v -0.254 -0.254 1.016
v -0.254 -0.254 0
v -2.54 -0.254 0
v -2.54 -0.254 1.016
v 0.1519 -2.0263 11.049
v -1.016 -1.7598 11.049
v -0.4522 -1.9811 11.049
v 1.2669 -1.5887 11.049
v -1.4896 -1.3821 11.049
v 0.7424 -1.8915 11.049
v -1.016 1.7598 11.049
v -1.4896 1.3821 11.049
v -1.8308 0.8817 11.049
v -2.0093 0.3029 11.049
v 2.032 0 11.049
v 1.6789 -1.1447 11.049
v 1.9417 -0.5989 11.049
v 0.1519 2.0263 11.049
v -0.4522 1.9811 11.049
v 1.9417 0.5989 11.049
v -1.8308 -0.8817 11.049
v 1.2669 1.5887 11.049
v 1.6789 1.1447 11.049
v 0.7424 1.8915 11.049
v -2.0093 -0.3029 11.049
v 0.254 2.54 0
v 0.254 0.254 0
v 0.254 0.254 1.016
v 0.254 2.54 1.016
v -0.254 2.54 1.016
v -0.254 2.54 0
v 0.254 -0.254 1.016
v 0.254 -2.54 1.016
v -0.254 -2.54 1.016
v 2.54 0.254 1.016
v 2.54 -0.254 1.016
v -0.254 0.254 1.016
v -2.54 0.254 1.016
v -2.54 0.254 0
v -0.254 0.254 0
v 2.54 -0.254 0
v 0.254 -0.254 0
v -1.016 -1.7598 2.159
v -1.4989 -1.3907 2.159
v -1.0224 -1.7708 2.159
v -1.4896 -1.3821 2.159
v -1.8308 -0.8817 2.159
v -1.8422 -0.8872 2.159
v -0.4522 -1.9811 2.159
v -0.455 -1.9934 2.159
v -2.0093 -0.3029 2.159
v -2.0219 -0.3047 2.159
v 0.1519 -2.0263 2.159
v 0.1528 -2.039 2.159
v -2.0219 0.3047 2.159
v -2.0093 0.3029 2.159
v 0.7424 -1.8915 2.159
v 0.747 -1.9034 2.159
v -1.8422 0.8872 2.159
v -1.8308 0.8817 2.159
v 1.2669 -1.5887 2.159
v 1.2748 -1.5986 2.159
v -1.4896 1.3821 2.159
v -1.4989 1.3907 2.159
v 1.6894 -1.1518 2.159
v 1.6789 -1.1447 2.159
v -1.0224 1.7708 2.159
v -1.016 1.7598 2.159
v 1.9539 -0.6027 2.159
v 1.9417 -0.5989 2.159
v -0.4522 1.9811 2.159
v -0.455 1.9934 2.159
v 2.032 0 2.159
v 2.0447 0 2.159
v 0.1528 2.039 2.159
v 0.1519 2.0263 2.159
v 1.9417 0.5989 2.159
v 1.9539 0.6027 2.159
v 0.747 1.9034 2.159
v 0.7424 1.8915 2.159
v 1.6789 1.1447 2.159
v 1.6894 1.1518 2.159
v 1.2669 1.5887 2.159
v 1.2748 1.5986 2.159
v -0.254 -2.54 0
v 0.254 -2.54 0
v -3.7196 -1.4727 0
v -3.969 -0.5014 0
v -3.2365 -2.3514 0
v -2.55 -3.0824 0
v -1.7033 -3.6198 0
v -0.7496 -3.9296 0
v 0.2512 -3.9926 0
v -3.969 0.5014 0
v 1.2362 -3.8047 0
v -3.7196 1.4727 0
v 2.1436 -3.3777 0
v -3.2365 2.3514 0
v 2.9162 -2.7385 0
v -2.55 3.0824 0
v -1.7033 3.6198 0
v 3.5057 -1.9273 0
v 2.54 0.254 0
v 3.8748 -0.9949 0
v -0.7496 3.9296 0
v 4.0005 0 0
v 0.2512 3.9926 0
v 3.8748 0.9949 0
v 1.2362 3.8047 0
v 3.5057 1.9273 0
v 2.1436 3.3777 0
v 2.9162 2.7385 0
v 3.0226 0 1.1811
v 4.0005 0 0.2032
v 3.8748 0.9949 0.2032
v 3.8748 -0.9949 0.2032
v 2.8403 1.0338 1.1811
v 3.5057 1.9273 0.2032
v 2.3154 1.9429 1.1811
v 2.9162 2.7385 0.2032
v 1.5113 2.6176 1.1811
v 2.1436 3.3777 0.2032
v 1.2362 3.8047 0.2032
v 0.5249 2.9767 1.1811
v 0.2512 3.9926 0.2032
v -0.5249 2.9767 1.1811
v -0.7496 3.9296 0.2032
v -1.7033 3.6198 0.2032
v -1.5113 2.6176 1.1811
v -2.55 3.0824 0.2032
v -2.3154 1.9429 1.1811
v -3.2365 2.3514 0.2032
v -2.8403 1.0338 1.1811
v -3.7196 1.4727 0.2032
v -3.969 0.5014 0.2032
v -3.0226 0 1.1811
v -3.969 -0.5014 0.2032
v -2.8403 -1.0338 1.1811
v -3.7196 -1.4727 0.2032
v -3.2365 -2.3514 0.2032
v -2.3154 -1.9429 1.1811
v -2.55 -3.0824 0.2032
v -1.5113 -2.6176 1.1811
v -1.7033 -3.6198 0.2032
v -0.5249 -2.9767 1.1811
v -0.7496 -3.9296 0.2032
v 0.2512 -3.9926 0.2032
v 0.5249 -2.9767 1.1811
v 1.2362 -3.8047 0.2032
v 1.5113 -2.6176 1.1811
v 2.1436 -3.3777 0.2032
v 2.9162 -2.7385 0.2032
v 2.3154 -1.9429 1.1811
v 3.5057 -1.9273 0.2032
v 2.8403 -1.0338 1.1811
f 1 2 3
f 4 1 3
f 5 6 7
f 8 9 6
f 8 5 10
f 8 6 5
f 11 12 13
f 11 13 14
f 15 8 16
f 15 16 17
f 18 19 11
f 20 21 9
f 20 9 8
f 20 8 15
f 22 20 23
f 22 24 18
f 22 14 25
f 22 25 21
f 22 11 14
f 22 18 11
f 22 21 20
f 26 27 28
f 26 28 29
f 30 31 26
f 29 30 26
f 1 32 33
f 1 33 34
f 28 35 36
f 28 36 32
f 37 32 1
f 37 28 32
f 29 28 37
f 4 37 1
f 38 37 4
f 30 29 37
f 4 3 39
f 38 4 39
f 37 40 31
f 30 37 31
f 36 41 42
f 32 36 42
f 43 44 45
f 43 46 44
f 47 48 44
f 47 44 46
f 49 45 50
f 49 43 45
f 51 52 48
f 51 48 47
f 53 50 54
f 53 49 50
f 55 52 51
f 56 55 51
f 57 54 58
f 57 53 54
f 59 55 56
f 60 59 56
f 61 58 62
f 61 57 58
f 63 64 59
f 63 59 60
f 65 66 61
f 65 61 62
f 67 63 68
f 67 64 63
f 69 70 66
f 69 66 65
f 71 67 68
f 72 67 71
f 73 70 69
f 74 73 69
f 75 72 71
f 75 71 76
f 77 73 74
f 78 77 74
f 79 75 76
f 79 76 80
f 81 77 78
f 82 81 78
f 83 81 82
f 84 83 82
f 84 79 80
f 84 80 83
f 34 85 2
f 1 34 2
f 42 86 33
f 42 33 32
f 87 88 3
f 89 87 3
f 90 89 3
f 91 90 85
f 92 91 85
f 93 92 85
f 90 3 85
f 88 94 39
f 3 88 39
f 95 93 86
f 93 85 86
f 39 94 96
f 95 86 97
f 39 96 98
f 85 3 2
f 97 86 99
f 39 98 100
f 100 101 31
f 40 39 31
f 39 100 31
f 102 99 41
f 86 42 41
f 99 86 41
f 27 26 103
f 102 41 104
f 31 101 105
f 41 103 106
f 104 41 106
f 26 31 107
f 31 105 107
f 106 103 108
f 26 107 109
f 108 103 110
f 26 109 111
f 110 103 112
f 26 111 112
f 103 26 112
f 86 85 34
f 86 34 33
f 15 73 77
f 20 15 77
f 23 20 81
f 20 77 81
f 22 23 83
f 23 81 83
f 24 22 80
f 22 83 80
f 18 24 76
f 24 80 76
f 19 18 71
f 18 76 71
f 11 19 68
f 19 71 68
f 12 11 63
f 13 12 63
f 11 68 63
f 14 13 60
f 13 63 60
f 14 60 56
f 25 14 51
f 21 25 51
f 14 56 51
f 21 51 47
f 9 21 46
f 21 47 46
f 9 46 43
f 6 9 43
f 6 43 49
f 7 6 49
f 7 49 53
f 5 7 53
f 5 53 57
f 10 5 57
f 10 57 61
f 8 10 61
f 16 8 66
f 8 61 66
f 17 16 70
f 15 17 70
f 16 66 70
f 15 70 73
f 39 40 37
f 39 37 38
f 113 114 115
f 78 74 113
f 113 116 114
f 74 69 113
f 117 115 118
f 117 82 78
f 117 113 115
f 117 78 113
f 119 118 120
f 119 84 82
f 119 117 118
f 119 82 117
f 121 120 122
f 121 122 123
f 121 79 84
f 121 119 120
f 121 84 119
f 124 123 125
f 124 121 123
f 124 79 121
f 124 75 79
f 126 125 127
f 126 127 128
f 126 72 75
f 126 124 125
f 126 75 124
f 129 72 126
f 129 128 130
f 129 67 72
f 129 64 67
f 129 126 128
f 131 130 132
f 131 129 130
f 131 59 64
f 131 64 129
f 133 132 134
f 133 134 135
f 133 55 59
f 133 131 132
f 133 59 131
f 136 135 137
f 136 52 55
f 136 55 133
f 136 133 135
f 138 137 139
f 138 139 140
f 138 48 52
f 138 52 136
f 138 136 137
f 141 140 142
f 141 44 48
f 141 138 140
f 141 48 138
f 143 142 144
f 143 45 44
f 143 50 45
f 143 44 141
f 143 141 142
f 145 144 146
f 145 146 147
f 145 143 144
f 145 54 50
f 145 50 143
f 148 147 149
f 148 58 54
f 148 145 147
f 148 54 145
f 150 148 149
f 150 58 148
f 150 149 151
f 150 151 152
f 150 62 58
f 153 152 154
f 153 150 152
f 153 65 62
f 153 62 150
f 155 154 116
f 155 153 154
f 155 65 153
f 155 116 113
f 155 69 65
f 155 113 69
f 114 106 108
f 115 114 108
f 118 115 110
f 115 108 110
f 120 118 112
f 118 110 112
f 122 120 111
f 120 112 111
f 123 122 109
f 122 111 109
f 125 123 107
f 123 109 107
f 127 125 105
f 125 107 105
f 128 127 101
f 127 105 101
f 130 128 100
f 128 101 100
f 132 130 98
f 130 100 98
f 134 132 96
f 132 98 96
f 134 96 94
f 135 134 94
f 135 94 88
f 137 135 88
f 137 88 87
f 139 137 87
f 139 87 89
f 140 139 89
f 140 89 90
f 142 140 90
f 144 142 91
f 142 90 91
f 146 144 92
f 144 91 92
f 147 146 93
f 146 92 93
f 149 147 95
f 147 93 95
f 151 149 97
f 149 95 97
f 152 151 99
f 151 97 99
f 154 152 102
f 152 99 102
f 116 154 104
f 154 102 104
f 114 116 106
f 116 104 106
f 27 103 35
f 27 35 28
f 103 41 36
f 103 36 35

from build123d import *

# Parameters (mm, degrees)
SKETCH1_R         = 4.0005
EXTRUDE1_DEPTH    = 2.159
SKETCH2_R         = 2.032
EXTRUDE2_DEPTH    = 8.89
SKETCH3_W         = 5.08
SKETCH3_H         = 0.508
EXTRUDE3_DEPTH    = 1.016
CIRPATTERN1_COUNT = 2
CIRPATTERN1_ANGLE = 90
CHAMFER1_SIZE     = 1.9558


with BuildPart() as part:
    # Sketch1 → Extrude1 (new body)
    with BuildSketch(Plane.XY):
        Circle(SKETCH1_R)
    extrude(amount=EXTRUDE1_DEPTH)

    # Sketch2 → Extrude2 (add)
    with BuildSketch(Plane.XY.offset(2.159)):
        Circle(SKETCH2_R)
    extrude(amount=EXTRUDE2_DEPTH)

    # Sketch3 → Extrude3 (cut)
    with BuildSketch(Plane(origin=(0, 0, 0), x_dir=(-1, 0, 0), z_dir=(0, 0, -1))):
        Rectangle(SKETCH3_W, SKETCH3_H)
    extrude3 = extrude(amount=-EXTRUDE3_DEPTH, mode=Mode.SUBTRACT)

    # CirPattern1: Extrude3 ×2 about axis
    cirpattern1_axis = Axis((0, 0, 0), (0, 0, -1))
    for i in range(1, CIRPATTERN1_COUNT):
        add(extrude3.rotate(cirpattern1_axis, i * CIRPATTERN1_ANGLE / (CIRPATTERN1_COUNT - 1)), mode=Mode.SUBTRACT)

    # Chamfer1
    chamfer1_edges = [part.edges().sort_by_distance(p)[0] for p in [
        (-4.0005, 0, 2.159),
    ]]
    chamfer(chamfer1_edges, length=CHAMFER1_SIZE)


solid = part.part
